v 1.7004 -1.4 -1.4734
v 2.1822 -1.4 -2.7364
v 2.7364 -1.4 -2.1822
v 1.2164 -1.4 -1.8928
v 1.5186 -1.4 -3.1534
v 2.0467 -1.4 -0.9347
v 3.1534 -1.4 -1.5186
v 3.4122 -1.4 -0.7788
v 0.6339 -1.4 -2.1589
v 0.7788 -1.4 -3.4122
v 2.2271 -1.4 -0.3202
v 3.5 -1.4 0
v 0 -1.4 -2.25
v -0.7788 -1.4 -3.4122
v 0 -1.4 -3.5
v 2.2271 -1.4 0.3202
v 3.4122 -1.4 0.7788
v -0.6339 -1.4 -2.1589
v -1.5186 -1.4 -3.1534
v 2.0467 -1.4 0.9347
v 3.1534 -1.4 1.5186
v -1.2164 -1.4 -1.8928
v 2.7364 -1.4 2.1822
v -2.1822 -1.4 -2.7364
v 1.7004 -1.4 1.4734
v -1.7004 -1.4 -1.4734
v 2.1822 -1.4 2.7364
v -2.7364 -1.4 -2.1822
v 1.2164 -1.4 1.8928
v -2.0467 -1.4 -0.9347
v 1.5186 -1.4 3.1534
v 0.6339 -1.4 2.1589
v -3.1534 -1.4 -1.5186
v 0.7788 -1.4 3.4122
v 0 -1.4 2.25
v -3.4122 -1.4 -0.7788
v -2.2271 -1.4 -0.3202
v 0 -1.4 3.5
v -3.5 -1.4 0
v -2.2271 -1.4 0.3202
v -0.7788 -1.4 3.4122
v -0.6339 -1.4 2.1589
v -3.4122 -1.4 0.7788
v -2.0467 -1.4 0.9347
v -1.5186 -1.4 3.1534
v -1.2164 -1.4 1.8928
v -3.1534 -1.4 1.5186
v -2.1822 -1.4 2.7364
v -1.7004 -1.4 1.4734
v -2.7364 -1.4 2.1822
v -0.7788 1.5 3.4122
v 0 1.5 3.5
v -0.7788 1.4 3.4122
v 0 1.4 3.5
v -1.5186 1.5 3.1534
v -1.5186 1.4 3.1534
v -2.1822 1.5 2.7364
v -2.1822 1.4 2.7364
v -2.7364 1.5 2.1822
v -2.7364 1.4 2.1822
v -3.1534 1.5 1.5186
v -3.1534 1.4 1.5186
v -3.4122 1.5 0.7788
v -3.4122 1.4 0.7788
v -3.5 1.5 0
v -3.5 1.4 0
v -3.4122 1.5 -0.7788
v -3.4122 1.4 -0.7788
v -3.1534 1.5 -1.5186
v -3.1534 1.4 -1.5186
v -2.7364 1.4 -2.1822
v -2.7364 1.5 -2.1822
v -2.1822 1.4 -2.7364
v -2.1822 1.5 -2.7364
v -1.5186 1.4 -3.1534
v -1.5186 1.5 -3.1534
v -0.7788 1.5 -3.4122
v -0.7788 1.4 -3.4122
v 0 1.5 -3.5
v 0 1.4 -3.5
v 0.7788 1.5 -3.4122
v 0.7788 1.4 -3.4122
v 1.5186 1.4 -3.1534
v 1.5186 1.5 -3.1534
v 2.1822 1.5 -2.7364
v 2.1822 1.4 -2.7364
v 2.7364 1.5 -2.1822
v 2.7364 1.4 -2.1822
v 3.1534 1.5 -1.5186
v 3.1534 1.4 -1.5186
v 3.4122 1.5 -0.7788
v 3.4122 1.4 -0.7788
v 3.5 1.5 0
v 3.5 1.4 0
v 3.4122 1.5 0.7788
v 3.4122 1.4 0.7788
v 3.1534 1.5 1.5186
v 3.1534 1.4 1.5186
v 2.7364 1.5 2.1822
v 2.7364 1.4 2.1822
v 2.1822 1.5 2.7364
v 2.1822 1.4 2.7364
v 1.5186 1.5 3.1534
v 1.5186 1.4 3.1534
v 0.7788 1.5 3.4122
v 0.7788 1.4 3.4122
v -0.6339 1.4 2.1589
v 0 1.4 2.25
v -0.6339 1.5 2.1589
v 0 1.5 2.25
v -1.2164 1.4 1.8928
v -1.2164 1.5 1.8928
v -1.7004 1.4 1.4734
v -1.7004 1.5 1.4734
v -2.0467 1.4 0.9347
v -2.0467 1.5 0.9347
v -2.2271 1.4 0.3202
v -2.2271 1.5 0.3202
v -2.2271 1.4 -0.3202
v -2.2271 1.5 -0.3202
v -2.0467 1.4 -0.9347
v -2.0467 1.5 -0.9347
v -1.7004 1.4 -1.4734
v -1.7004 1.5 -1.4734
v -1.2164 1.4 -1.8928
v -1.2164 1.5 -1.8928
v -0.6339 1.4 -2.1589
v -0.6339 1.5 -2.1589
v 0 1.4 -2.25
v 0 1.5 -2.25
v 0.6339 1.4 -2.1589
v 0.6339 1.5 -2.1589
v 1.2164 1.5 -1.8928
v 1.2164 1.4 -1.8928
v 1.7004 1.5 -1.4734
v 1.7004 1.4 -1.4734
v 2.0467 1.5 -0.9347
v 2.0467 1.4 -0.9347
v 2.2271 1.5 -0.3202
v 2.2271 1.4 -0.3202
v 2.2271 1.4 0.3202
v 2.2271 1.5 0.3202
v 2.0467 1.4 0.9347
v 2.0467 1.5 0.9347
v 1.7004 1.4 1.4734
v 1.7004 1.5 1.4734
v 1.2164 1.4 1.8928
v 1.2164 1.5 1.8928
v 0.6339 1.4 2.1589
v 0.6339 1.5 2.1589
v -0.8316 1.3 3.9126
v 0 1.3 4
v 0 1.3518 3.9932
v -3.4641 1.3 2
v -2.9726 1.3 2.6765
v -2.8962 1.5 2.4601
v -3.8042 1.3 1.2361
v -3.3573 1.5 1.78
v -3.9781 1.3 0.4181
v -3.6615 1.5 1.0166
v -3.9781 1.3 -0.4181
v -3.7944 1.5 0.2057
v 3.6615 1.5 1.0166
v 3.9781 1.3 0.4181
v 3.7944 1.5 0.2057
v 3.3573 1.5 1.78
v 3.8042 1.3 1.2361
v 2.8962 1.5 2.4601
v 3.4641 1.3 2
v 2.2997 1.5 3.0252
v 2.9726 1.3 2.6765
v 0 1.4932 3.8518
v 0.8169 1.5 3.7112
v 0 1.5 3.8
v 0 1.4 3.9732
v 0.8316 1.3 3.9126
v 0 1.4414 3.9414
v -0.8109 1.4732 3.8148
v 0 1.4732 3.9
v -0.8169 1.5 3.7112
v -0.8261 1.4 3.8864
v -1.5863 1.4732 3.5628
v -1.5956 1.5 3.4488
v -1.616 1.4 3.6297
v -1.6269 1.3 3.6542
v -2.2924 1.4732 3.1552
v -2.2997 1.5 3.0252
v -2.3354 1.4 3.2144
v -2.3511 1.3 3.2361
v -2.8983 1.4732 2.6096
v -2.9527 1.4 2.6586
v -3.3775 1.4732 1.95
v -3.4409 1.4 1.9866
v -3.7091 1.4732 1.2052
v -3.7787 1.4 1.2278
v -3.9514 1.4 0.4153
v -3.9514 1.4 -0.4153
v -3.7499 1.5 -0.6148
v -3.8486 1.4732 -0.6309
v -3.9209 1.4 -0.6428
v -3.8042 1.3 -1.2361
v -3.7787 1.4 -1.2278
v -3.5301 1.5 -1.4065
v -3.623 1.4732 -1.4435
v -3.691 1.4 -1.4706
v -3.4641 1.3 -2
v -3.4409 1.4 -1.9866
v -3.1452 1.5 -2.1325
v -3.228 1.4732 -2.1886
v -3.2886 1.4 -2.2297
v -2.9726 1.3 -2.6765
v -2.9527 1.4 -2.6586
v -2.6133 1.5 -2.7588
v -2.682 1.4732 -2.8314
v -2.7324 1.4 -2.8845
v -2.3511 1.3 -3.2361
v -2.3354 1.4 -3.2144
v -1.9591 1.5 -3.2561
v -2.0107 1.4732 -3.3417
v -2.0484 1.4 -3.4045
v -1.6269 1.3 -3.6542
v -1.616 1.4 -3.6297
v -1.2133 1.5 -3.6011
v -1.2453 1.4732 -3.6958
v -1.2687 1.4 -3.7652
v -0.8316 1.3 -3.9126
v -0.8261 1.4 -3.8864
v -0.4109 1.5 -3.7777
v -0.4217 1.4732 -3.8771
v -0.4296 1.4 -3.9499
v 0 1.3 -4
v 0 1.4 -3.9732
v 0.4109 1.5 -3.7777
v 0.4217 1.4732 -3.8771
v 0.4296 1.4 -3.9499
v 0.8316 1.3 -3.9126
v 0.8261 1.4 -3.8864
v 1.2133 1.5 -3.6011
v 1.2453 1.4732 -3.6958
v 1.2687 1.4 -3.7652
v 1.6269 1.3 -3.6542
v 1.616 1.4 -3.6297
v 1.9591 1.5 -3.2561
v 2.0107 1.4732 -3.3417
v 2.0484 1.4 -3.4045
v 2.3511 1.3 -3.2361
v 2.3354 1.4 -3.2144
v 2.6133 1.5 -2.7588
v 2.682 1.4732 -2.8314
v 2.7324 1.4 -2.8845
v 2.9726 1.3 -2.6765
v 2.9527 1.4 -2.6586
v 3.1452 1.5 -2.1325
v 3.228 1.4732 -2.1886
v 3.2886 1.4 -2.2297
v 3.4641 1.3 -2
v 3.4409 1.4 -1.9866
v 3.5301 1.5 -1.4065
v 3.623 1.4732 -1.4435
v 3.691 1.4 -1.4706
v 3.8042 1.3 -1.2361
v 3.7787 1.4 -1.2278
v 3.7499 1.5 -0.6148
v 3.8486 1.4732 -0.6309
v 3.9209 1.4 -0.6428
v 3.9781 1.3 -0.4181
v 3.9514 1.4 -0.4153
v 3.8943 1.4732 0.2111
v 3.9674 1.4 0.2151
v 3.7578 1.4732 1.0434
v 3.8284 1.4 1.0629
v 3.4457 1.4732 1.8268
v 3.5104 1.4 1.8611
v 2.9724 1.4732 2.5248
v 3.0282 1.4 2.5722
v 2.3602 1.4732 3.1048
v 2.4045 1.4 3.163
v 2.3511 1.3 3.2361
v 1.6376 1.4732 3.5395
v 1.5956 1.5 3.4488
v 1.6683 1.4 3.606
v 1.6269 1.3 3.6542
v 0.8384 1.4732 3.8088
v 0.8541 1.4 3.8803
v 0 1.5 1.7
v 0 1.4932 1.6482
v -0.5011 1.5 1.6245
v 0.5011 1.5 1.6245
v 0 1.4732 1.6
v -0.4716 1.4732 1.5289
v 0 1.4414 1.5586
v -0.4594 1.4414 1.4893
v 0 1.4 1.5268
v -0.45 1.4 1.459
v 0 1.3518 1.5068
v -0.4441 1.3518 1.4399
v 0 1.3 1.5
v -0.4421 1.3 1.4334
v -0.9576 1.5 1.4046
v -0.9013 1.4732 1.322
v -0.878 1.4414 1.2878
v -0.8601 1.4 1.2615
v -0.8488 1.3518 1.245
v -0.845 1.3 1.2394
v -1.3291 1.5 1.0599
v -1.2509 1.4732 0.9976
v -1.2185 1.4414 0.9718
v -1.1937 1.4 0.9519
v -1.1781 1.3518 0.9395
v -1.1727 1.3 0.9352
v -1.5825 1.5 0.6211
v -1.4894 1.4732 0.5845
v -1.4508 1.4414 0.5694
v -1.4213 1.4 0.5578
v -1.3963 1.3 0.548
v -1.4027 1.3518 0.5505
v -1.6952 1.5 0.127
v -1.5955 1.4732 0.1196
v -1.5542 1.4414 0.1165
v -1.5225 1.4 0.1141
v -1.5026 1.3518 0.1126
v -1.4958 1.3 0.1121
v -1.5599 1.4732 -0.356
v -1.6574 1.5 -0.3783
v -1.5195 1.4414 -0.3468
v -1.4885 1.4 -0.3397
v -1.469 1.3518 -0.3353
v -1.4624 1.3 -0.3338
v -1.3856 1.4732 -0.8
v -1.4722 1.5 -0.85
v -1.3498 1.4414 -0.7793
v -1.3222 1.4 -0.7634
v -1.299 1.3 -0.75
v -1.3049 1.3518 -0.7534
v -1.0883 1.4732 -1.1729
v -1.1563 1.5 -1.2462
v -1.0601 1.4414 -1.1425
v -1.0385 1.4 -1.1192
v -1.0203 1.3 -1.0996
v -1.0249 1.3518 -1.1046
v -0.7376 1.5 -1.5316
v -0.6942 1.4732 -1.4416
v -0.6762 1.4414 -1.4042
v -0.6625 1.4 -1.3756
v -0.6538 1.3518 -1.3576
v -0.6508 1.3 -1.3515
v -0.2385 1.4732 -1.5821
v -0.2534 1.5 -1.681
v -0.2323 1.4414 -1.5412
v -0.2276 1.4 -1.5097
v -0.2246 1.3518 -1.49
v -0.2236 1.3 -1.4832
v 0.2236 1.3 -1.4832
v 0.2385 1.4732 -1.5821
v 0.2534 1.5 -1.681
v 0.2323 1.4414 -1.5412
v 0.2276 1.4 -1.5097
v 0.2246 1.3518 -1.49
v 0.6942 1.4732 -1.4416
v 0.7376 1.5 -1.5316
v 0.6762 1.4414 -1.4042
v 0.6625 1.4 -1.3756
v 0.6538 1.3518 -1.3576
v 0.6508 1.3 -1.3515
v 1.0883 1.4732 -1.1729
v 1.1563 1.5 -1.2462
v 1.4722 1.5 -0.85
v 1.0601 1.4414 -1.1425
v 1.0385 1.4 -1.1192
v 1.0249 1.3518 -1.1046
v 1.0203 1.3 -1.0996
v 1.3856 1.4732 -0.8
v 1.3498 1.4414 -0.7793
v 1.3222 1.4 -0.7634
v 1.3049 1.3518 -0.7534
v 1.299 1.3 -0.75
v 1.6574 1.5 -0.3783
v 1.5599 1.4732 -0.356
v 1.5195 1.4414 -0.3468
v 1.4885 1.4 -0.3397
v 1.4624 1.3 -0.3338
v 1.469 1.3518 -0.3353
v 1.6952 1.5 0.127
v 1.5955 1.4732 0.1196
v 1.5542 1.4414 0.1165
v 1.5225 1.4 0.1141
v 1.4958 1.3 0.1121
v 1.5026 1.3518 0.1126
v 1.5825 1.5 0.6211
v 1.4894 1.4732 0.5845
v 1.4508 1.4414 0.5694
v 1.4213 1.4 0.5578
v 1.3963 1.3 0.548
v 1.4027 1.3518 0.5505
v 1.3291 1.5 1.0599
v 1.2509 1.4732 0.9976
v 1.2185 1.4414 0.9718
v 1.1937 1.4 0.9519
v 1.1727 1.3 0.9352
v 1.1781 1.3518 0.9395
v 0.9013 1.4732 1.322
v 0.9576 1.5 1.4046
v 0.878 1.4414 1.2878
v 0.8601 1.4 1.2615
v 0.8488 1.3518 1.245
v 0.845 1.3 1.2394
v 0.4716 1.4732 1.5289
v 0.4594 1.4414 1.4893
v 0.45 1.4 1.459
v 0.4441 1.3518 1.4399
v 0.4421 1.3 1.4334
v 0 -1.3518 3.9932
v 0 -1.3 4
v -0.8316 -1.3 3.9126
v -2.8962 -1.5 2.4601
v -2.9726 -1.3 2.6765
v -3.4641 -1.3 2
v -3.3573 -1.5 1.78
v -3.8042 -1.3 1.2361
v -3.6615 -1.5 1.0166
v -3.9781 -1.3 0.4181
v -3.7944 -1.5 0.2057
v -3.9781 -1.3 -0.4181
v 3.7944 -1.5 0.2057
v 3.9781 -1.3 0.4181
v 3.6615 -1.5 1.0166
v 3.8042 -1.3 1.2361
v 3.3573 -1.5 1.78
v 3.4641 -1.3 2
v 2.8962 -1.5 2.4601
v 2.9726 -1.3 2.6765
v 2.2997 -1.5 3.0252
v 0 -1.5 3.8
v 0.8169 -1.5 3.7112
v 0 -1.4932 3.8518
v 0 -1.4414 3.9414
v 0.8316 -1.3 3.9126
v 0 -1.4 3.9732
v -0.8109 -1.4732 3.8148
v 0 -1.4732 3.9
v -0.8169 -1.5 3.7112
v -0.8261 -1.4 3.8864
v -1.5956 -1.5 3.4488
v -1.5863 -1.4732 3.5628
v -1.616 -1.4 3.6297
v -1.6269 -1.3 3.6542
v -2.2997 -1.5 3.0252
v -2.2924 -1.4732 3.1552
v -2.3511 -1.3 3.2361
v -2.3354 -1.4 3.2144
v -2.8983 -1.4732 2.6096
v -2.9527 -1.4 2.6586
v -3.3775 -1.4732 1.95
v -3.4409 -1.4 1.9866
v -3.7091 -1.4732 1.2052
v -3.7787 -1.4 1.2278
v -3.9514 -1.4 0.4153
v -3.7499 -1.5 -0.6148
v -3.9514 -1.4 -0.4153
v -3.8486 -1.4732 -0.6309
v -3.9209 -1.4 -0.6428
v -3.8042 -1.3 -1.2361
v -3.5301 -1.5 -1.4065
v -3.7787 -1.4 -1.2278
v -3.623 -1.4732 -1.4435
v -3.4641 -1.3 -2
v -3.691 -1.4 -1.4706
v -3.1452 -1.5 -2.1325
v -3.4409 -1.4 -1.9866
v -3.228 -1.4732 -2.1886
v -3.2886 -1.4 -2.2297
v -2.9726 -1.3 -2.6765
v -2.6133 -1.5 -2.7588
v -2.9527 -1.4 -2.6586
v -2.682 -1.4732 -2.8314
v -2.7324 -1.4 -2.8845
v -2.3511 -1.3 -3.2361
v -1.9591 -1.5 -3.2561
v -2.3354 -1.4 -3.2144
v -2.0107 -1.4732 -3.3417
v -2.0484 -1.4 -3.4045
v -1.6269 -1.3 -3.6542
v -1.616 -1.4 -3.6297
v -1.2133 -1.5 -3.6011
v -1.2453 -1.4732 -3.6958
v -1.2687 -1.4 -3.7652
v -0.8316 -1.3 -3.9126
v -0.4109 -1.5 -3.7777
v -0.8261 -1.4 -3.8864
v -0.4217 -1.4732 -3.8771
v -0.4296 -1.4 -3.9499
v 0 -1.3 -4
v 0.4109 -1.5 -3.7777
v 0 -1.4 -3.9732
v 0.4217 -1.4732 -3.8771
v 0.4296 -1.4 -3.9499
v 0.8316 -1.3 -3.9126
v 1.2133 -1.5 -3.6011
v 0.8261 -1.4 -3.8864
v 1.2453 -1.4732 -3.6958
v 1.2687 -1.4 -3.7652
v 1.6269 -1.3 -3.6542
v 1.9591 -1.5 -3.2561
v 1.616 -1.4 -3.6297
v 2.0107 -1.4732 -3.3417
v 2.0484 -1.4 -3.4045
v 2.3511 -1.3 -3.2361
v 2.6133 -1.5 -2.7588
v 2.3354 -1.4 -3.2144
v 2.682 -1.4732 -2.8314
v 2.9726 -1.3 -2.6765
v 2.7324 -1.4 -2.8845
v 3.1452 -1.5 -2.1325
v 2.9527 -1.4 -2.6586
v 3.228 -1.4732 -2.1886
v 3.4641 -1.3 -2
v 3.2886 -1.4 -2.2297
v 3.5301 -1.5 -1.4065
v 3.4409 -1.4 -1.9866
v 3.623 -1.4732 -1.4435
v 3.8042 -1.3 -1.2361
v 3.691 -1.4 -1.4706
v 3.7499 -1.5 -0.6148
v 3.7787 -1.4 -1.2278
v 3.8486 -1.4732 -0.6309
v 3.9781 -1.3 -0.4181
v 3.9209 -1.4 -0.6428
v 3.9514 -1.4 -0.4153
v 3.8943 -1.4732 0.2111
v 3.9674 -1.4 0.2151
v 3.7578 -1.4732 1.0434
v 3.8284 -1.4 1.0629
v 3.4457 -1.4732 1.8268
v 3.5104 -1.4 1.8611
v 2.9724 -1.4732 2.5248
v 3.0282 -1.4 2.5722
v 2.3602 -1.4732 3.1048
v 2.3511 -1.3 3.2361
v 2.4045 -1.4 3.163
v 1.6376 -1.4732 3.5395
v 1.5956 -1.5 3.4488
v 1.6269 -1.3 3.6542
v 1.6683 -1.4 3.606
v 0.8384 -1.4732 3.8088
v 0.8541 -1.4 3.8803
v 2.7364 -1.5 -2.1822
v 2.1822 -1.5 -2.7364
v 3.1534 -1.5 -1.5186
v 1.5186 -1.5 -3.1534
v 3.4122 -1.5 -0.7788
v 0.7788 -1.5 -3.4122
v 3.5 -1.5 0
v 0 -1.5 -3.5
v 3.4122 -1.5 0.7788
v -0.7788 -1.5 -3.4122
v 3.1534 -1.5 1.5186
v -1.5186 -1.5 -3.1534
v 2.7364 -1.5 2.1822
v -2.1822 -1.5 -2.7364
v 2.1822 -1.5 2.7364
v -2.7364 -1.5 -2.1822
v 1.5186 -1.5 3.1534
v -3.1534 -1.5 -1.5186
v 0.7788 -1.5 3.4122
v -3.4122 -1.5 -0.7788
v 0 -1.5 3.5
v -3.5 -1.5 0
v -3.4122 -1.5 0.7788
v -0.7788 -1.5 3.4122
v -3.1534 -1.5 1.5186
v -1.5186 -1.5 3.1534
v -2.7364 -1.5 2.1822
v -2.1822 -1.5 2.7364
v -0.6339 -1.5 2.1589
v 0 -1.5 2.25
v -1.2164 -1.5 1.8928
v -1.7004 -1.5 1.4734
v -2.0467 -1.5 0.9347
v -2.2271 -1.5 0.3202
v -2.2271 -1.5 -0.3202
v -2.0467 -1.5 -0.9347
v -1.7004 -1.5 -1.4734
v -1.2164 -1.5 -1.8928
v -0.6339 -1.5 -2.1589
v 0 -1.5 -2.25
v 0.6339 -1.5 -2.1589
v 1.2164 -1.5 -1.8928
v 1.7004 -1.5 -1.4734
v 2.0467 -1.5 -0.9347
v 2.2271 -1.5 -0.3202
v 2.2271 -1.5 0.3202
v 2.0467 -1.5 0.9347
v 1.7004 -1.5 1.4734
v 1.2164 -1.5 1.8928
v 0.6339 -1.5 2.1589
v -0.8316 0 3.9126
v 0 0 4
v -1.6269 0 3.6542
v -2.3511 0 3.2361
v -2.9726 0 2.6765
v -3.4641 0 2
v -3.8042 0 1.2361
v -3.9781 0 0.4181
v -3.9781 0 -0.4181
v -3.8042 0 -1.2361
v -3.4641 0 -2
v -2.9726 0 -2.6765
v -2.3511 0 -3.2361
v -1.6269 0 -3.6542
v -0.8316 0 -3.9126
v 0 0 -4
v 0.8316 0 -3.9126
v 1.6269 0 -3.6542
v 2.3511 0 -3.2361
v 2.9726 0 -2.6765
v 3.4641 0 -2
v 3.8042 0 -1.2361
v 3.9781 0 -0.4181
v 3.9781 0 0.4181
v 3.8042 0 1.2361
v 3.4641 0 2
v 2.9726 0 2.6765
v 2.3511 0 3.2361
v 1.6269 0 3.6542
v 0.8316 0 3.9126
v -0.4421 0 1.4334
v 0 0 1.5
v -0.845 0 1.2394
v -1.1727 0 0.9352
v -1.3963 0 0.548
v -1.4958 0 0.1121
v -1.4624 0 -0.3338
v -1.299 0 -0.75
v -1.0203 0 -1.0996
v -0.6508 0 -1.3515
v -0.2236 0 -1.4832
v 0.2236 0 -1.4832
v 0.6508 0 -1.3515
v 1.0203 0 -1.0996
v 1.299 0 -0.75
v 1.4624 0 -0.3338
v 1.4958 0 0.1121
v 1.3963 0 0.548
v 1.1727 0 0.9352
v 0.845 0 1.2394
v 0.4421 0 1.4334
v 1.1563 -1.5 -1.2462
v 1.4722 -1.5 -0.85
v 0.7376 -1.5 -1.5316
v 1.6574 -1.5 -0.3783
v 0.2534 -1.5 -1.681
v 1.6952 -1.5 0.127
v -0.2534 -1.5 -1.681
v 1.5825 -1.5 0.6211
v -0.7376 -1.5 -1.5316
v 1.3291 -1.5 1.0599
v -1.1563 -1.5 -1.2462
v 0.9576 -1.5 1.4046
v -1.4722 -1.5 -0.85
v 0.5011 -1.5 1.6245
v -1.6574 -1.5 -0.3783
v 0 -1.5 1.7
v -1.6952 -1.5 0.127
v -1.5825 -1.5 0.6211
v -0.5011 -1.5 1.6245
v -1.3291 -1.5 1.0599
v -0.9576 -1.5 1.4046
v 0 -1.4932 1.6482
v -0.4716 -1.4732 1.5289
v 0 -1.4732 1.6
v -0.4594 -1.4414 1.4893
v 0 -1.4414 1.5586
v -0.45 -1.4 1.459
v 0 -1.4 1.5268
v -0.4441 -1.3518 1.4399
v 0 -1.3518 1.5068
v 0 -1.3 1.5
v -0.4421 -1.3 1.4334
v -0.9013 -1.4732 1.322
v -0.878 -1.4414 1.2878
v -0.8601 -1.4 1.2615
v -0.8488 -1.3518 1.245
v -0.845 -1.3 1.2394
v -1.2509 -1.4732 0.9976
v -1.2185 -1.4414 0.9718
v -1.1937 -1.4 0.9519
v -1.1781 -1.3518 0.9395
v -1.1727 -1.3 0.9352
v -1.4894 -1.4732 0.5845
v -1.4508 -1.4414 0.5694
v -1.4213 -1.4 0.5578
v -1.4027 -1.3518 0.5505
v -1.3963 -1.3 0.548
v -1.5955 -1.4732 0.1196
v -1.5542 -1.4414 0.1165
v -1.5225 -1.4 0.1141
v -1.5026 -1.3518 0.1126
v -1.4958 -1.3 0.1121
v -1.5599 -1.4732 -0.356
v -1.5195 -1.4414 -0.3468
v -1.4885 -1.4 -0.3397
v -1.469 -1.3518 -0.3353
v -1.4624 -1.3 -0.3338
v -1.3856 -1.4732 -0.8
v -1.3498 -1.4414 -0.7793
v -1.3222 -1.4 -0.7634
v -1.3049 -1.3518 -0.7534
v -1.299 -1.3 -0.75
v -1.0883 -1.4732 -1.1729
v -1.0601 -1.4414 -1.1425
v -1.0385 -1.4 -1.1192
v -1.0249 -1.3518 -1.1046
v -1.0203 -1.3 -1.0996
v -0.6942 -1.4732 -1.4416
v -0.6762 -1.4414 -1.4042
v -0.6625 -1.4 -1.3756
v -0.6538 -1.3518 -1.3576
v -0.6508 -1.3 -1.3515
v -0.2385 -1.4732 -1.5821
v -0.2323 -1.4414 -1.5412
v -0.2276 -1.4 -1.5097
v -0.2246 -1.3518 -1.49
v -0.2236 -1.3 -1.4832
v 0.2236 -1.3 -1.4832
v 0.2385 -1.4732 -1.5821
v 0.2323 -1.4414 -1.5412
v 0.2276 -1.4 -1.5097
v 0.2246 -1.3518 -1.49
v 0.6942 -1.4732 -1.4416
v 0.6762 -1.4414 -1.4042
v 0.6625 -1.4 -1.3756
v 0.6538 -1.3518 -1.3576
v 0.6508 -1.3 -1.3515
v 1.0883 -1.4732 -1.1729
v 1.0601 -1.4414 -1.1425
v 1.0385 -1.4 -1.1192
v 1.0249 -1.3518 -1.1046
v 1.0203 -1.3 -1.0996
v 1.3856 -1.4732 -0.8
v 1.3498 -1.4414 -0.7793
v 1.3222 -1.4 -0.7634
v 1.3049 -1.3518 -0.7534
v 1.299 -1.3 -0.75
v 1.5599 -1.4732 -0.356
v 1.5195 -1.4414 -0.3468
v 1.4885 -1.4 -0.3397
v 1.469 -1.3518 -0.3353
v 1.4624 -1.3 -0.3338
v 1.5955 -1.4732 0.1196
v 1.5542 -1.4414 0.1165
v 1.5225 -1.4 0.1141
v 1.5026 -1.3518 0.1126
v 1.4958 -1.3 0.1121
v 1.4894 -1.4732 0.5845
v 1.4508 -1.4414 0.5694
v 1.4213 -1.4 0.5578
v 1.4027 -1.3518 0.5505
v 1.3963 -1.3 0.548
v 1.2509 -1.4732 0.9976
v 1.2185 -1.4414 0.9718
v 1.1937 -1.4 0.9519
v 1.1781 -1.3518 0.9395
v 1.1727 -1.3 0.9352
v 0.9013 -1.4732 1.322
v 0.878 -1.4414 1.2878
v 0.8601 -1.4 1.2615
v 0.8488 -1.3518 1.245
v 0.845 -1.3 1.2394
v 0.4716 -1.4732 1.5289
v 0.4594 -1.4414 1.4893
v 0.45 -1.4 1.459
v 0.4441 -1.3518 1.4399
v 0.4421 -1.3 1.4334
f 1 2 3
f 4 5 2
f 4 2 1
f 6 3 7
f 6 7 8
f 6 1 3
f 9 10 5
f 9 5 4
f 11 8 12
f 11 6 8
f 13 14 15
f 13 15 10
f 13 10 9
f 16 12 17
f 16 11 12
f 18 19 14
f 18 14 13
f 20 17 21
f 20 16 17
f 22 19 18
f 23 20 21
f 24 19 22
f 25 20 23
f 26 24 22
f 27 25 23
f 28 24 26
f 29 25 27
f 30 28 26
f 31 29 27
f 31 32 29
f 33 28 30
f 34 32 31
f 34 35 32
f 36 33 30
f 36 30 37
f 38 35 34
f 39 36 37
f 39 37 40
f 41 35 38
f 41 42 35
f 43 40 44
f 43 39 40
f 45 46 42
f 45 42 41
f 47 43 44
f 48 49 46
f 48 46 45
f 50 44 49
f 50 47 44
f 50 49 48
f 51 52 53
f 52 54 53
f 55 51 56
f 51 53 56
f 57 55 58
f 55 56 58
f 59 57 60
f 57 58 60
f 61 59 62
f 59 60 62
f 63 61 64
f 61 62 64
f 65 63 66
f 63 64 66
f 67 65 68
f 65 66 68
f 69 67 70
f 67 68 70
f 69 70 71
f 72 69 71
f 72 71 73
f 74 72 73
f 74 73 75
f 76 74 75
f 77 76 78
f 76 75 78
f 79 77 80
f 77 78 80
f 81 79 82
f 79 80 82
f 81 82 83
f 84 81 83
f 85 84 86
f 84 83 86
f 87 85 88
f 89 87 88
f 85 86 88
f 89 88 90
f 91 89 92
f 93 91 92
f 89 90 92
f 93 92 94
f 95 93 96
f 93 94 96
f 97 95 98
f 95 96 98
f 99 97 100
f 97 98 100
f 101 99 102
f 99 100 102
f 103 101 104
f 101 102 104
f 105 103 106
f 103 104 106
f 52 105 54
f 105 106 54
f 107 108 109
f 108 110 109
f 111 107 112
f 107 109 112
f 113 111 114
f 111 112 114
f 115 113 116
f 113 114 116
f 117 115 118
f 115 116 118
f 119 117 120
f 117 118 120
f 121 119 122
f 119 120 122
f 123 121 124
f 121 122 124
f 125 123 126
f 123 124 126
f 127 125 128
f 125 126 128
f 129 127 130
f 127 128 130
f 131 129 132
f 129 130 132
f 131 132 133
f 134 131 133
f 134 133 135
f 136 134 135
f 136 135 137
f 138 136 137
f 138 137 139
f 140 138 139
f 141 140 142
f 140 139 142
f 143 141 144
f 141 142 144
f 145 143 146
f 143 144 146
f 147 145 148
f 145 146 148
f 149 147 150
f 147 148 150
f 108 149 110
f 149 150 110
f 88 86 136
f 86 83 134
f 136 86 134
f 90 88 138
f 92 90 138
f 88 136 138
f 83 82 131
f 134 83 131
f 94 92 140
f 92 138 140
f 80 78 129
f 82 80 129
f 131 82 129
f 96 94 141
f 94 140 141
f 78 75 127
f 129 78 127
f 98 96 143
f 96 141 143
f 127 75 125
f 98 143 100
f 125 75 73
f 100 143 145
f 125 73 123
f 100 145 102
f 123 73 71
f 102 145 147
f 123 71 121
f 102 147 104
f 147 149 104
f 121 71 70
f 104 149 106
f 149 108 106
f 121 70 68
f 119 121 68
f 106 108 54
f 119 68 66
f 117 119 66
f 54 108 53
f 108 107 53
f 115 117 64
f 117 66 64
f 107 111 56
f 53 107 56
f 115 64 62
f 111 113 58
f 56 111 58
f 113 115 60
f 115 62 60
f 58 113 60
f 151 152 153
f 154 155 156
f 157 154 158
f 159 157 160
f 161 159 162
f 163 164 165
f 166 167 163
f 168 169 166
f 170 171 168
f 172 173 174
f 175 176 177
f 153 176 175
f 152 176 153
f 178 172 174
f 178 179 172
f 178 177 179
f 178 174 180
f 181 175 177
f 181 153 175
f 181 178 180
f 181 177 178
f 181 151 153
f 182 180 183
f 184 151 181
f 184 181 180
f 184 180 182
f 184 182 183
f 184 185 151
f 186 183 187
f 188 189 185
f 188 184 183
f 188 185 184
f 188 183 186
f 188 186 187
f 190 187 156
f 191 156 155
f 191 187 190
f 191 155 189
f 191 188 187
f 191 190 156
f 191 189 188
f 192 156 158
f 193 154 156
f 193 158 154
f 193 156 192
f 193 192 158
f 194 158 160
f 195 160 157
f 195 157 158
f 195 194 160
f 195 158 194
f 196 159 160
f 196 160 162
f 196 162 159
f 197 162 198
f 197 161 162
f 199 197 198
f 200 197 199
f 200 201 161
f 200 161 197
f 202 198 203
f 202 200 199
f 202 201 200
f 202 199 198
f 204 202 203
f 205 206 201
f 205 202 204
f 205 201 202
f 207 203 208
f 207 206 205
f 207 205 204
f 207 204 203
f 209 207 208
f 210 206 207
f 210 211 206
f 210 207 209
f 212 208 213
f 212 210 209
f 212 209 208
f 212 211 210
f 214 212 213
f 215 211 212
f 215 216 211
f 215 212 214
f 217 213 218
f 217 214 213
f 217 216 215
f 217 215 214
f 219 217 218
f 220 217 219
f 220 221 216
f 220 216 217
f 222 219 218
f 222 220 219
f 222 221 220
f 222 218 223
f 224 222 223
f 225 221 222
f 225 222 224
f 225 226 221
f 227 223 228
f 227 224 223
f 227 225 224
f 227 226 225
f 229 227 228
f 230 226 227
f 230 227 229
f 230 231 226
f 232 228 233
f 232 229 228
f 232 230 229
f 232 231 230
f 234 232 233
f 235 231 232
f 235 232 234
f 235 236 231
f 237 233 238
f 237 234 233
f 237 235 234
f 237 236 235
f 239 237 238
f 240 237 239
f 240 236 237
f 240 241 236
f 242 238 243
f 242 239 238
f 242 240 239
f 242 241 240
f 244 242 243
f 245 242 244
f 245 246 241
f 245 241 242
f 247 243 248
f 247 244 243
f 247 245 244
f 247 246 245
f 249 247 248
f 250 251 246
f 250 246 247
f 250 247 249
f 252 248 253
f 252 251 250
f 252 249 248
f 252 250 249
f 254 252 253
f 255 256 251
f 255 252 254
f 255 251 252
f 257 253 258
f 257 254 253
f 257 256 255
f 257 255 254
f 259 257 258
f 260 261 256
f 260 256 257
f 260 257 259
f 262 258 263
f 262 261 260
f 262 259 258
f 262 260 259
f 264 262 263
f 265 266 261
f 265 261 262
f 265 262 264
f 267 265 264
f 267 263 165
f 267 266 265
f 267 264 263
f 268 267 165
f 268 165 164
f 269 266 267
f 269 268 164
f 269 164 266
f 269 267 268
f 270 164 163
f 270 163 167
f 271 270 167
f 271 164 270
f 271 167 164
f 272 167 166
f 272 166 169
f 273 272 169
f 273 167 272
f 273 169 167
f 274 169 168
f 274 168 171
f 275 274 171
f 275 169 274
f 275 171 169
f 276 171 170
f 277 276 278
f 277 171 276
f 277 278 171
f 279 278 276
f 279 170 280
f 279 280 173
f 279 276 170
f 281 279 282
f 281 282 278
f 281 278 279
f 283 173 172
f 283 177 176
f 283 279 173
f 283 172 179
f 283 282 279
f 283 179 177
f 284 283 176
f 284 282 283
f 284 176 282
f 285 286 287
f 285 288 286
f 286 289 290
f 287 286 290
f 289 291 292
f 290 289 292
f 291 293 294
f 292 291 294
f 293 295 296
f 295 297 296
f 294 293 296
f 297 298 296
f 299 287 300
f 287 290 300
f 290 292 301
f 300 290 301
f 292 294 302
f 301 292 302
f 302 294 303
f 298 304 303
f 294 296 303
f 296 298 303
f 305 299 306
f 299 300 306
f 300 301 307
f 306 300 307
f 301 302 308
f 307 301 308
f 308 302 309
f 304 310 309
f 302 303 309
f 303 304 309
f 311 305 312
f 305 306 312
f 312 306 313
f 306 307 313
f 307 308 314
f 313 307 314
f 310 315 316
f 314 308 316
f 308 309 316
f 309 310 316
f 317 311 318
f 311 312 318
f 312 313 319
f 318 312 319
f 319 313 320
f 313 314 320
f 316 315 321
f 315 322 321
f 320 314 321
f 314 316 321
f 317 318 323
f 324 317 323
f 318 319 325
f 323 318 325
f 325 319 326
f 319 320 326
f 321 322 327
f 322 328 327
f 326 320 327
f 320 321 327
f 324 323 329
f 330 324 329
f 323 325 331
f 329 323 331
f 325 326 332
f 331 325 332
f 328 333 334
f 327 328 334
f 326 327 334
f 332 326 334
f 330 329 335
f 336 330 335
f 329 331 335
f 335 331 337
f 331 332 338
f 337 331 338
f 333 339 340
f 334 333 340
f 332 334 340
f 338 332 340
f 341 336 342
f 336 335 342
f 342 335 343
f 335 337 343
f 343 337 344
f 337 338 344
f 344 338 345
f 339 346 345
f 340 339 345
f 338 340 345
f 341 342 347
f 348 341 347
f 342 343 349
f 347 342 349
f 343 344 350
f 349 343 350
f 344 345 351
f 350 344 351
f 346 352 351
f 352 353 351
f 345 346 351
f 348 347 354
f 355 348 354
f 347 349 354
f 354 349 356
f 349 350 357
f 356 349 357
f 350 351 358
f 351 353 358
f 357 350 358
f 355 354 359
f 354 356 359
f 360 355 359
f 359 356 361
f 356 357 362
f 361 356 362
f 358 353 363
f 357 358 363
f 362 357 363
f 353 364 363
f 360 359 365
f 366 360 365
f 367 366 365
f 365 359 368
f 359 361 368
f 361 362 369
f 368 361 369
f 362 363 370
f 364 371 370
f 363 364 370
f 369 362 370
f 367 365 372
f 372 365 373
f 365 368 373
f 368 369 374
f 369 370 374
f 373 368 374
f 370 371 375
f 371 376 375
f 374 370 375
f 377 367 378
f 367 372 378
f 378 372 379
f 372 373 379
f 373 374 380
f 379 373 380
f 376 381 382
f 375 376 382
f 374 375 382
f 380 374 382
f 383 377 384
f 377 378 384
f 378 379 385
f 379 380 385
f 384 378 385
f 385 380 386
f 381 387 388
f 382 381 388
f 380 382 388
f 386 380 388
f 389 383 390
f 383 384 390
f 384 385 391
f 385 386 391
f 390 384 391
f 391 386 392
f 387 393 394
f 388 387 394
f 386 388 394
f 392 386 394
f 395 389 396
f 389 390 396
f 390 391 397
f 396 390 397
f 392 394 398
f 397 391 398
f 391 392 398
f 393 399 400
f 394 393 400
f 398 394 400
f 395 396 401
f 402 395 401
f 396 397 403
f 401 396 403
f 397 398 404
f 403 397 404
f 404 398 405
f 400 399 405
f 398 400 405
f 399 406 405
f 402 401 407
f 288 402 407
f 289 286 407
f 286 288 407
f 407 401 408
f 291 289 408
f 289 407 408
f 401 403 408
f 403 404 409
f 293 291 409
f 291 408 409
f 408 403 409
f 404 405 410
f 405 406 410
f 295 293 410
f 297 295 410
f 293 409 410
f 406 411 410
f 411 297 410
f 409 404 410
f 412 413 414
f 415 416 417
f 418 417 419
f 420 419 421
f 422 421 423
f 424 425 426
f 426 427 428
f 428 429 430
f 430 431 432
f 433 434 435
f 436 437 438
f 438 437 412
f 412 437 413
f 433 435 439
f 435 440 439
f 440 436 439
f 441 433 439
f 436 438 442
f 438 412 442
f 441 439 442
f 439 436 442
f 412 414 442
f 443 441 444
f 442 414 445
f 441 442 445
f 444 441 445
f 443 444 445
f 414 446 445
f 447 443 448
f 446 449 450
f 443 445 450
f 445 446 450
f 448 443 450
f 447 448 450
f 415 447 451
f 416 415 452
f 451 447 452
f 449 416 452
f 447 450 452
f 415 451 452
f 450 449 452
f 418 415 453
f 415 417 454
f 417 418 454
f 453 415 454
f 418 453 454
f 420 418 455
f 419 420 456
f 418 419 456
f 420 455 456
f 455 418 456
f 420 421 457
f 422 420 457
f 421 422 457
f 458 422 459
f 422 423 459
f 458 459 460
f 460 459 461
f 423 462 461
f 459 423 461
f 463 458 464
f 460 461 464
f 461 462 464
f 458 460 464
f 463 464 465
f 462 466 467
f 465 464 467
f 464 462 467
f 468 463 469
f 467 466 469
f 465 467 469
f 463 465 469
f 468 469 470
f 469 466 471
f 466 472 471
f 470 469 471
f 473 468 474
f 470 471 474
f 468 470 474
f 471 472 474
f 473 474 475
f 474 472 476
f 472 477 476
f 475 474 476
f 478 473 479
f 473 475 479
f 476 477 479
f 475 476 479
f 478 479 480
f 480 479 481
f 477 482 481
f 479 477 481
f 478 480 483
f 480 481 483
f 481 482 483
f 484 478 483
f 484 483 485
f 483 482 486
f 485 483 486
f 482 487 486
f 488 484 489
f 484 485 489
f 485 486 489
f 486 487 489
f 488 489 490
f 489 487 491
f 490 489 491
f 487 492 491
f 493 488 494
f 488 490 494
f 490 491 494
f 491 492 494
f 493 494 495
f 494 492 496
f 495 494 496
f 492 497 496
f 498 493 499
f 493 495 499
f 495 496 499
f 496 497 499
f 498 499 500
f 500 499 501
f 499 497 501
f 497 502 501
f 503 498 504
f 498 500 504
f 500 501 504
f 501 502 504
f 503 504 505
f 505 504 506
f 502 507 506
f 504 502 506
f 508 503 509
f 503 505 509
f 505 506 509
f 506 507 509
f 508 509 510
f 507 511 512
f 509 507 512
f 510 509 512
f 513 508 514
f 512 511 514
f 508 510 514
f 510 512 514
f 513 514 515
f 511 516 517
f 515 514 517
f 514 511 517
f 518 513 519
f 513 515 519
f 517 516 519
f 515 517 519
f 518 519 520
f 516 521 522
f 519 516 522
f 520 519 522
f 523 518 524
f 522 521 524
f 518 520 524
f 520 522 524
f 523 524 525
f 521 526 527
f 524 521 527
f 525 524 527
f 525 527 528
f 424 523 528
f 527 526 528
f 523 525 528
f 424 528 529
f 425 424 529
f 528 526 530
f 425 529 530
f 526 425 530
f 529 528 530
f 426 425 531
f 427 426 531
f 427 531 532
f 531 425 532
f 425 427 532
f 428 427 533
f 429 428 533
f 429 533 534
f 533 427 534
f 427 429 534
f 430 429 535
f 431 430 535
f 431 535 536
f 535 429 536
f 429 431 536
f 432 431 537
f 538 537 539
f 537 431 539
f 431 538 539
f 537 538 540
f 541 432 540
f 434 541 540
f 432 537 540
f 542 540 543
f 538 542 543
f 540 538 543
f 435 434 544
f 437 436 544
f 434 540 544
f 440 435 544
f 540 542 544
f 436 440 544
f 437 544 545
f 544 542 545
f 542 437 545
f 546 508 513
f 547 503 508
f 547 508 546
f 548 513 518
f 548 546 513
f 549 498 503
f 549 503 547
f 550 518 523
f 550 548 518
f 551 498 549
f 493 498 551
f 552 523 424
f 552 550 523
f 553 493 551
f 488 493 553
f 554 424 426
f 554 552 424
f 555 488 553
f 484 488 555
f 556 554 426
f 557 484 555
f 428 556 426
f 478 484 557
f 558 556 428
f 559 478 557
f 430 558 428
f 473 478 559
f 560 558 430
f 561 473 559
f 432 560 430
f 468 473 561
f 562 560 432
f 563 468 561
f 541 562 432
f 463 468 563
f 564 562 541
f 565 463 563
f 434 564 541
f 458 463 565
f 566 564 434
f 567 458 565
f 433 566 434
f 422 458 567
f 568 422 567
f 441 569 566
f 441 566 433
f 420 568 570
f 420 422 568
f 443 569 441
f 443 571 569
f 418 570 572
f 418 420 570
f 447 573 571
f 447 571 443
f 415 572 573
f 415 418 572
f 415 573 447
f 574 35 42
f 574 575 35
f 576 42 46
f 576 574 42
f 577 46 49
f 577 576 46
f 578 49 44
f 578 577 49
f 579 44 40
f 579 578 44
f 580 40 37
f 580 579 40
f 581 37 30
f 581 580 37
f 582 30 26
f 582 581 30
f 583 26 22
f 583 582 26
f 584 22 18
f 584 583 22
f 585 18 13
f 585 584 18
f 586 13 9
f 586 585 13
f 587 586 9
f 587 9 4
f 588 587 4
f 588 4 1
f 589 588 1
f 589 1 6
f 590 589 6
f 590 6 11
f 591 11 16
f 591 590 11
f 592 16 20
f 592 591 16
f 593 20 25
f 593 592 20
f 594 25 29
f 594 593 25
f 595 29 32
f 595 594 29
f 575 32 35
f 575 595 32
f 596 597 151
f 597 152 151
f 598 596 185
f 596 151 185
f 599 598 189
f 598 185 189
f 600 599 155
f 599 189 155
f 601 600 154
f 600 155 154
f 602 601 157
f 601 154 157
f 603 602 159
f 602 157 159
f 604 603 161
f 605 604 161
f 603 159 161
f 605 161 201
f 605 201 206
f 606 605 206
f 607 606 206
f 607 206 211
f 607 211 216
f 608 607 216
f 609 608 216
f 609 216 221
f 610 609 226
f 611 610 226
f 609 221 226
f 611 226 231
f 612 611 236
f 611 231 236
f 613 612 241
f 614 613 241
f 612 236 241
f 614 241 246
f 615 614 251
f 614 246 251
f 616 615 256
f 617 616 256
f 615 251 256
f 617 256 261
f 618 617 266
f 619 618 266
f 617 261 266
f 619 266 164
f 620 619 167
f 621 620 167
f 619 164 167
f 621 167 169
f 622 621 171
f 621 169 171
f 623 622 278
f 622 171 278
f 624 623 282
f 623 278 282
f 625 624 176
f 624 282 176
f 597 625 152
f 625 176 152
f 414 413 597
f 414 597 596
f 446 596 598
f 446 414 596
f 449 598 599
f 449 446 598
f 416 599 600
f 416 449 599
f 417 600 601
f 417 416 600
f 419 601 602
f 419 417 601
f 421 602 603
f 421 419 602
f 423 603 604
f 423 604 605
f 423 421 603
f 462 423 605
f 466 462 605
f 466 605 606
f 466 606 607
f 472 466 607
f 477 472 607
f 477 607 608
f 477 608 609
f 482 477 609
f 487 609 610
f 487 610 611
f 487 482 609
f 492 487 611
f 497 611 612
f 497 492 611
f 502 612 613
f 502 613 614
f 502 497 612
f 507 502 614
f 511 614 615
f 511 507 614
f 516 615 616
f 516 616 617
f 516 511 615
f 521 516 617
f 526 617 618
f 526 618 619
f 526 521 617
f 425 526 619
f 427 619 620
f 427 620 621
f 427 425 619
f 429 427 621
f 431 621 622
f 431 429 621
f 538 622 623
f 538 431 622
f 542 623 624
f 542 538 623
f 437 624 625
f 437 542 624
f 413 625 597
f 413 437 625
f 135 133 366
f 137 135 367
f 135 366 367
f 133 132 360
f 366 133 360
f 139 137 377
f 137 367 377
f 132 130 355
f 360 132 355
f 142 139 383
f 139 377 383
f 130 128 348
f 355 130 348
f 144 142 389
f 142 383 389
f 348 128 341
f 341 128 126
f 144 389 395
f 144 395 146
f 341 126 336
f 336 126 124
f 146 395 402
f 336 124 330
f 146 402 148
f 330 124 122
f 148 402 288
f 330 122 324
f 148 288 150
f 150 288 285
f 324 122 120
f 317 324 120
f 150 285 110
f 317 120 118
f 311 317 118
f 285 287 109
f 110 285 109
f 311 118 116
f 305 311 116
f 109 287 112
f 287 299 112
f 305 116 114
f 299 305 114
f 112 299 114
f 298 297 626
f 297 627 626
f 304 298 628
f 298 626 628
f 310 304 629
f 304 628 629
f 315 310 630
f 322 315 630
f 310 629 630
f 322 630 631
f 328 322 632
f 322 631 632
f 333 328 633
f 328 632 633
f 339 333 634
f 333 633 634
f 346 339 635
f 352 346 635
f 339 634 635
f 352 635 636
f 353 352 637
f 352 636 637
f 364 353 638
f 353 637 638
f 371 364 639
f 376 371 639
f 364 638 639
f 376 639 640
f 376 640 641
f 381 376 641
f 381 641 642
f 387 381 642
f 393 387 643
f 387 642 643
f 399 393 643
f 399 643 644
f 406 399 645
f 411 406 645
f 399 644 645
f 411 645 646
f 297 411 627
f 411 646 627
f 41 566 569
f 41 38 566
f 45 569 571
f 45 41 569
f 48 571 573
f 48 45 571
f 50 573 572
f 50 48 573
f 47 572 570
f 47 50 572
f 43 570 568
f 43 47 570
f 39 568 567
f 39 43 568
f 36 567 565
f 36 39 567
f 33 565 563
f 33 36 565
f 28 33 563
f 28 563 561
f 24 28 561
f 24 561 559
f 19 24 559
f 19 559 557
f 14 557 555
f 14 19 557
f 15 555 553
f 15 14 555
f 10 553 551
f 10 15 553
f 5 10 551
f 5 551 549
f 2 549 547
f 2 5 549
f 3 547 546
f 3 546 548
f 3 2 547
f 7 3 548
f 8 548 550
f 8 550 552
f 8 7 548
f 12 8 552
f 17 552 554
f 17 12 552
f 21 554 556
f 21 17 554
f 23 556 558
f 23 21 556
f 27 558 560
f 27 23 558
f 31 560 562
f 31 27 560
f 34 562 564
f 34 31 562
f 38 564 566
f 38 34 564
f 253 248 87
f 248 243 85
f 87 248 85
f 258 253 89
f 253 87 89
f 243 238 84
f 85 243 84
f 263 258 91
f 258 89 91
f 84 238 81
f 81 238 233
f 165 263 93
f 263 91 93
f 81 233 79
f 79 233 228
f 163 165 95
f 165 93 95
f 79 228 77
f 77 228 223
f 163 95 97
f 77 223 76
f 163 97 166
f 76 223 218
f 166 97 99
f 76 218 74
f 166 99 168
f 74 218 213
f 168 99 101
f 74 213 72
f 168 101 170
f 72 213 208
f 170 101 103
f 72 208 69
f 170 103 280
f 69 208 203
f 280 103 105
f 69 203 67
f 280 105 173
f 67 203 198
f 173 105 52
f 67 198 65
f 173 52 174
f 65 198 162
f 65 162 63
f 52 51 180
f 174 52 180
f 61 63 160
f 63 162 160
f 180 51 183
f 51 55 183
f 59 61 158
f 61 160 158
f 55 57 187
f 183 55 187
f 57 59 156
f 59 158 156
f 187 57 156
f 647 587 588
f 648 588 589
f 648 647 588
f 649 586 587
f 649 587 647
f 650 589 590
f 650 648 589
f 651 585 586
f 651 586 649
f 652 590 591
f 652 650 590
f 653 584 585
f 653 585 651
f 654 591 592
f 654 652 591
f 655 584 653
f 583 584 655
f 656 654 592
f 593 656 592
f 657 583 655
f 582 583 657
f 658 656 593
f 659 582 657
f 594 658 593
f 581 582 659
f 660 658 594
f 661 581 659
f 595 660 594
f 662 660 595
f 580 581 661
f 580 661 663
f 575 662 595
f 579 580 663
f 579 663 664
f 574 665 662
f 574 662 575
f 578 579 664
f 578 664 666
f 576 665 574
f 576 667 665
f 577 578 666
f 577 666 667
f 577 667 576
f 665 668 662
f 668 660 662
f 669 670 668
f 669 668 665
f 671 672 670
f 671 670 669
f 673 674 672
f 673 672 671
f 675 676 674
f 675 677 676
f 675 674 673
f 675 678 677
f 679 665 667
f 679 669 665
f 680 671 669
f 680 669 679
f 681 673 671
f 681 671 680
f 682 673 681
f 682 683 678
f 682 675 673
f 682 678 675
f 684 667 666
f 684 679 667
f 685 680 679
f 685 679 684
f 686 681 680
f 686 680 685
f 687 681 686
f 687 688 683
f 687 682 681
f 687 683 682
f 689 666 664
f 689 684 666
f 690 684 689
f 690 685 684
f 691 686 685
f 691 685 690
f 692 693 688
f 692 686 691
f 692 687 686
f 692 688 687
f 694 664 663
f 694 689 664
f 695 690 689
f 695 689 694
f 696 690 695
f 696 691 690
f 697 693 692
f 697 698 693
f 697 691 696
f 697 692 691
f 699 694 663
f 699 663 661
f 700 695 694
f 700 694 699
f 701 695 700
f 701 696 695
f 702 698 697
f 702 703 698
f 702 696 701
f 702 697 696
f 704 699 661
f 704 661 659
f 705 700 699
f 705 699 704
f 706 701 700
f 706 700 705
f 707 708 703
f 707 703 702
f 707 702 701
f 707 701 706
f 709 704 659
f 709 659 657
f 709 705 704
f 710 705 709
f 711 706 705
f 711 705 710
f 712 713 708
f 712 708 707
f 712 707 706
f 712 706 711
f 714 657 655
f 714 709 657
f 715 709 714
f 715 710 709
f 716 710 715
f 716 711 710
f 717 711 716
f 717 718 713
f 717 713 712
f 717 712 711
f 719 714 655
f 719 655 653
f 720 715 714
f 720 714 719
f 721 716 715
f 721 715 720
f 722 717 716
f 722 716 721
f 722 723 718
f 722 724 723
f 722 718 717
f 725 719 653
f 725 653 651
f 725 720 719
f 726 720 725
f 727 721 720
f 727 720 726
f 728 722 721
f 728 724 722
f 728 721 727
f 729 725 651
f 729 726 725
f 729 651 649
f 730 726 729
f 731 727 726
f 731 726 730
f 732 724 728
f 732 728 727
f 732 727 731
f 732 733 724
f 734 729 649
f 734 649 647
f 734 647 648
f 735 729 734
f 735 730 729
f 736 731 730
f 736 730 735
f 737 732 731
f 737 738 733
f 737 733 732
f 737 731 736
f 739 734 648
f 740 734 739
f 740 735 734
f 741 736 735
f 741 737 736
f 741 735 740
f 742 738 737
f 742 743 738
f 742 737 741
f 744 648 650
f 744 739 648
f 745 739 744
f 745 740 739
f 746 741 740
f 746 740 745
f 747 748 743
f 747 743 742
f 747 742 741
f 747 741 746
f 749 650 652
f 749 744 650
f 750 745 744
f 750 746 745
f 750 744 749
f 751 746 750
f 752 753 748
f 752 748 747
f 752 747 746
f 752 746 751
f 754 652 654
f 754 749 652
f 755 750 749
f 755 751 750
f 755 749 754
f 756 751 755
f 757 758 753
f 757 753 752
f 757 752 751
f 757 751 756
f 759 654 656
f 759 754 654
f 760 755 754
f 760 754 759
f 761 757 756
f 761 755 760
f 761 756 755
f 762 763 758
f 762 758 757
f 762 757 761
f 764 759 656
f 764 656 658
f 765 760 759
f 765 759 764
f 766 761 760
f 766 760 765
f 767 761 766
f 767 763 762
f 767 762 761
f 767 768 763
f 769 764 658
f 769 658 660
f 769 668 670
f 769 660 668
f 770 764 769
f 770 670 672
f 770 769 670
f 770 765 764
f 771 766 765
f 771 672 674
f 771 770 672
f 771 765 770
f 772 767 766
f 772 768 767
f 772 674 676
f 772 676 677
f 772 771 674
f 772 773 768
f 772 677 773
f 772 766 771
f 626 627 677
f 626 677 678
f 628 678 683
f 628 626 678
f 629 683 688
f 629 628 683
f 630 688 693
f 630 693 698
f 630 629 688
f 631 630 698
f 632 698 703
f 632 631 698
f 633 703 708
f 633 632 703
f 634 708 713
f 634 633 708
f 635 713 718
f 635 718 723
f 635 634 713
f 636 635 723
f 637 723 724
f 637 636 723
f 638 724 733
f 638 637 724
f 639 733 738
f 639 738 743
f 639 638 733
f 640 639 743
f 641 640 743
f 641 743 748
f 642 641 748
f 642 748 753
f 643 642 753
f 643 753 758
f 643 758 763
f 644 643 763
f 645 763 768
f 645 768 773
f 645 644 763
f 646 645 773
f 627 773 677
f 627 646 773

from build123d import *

# Parameters (mm, degrees)
FILLET1_R            = 0.2
FILLET1_OF_MIRROR1_R = 0.2


with BuildPart() as part:
    # Sketch1 → Revolve1 (revolve)
    with BuildSketch(Plane(origin=(0, 0, 0), x_dir=(0, 0, -1), z_dir=(1, 0, 0))):
        Polygon((-4, 1.5), (-3.5, 1.5), (-3.5, 1.4), (-2.25, 1.4), (-2.25, 1.5), (-1.5, 1.5), (-1.5, 0), (-4, 0), align=None)
    revolve1 = revolve(axis=Axis((0, 17.307692308, 0), (0, -1, 0)))

    # Fillet1
    fillet1_edges = [part.edges().sort_by_distance(p)[0] for p in [
        (0, 1.5, -4),
        (0, 1.5, -1.5),
    ]]
    fillet(fillet1_edges, radius=FILLET1_R)

    # Mirror1: Revolve1 across plane
    add(revolve1.mirror(Plane.ZX))

    # Fillet1 of Mirror1
    fillet1_of_mirror1_edges = [part.edges().sort_by_distance(p)[0] for p in [
        (0, -1.5, -4),
        (0, -1.5, -1.5),
    ]]
    fillet(fillet1_of_mirror1_edges, radius=FILLET1_OF_MIRROR1_R)


solid = part.part
